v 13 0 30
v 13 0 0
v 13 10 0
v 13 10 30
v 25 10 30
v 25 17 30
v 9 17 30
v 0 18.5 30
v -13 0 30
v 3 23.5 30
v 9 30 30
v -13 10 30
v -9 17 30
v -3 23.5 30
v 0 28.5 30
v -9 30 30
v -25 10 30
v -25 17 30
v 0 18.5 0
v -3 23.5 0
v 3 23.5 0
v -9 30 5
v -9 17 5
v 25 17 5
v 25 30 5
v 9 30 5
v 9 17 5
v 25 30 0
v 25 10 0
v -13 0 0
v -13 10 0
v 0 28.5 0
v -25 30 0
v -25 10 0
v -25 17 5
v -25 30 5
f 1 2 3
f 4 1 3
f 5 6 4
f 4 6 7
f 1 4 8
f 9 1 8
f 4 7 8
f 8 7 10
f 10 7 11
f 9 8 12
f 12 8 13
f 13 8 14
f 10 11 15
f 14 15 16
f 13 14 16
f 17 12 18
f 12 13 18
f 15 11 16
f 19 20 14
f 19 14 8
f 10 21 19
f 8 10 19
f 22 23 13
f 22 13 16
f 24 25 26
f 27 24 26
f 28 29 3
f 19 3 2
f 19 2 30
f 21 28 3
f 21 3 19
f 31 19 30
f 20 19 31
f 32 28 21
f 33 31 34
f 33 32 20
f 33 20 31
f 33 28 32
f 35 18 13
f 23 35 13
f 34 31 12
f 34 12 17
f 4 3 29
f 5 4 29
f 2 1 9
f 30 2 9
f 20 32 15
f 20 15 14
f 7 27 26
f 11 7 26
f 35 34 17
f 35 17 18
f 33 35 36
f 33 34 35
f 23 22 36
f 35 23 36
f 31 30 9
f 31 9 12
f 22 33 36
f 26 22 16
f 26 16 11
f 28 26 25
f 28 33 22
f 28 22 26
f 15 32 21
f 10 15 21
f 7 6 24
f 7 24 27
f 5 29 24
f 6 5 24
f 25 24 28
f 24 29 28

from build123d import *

# Parameters (mm, degrees)
EXTRUDE_1_DEPTH = 30
SKETCH_2_W      = 50
SKETCH_2_H      = 20
EXTRUDE_2_DEPTH = 5


with BuildPart() as part:
    # Эскиз1 → Бобышка-Вытянуть1 (new body)
    with BuildSketch(Plane.XY):
        Polygon((9, 17), (9, 23.5), (3, 23.5), (0, 18.5), (0, 0), (13, 0), (13, 10), (25, 10), (25, 17), align=None)
        Polygon((3, 23.5), (9, 23.5), (9, 30), (0, 30), (0, 28.5), align=None)
    extrude_1 = extrude(amount=EXTRUDE_1_DEPTH)

    # Зеркальное отражение1: Бобышка-Вытянуть1 across plane
    add(extrude_1.mirror(Plane(origin=(0, 0, 30), x_dir=(0, 0, 1), z_dir=(-1, 0, 0))))

    # Эскиз2 → Бобышка-Вытянуть2 (add)
    with BuildSketch(Plane(origin=(0, 0, 0), x_dir=(-1, 0, 0), z_dir=(0, 0, -1))):
        with Locations((0, 20)):
            Rectangle(SKETCH_2_W, SKETCH_2_H)
        Polygon((0, 28.5), (3, 23.5), (0, 18.5), (-3, 23.5), align=None, mode=Mode.SUBTRACT)
    extrude(amount=-EXTRUDE_2_DEPTH)


solid = part.part
